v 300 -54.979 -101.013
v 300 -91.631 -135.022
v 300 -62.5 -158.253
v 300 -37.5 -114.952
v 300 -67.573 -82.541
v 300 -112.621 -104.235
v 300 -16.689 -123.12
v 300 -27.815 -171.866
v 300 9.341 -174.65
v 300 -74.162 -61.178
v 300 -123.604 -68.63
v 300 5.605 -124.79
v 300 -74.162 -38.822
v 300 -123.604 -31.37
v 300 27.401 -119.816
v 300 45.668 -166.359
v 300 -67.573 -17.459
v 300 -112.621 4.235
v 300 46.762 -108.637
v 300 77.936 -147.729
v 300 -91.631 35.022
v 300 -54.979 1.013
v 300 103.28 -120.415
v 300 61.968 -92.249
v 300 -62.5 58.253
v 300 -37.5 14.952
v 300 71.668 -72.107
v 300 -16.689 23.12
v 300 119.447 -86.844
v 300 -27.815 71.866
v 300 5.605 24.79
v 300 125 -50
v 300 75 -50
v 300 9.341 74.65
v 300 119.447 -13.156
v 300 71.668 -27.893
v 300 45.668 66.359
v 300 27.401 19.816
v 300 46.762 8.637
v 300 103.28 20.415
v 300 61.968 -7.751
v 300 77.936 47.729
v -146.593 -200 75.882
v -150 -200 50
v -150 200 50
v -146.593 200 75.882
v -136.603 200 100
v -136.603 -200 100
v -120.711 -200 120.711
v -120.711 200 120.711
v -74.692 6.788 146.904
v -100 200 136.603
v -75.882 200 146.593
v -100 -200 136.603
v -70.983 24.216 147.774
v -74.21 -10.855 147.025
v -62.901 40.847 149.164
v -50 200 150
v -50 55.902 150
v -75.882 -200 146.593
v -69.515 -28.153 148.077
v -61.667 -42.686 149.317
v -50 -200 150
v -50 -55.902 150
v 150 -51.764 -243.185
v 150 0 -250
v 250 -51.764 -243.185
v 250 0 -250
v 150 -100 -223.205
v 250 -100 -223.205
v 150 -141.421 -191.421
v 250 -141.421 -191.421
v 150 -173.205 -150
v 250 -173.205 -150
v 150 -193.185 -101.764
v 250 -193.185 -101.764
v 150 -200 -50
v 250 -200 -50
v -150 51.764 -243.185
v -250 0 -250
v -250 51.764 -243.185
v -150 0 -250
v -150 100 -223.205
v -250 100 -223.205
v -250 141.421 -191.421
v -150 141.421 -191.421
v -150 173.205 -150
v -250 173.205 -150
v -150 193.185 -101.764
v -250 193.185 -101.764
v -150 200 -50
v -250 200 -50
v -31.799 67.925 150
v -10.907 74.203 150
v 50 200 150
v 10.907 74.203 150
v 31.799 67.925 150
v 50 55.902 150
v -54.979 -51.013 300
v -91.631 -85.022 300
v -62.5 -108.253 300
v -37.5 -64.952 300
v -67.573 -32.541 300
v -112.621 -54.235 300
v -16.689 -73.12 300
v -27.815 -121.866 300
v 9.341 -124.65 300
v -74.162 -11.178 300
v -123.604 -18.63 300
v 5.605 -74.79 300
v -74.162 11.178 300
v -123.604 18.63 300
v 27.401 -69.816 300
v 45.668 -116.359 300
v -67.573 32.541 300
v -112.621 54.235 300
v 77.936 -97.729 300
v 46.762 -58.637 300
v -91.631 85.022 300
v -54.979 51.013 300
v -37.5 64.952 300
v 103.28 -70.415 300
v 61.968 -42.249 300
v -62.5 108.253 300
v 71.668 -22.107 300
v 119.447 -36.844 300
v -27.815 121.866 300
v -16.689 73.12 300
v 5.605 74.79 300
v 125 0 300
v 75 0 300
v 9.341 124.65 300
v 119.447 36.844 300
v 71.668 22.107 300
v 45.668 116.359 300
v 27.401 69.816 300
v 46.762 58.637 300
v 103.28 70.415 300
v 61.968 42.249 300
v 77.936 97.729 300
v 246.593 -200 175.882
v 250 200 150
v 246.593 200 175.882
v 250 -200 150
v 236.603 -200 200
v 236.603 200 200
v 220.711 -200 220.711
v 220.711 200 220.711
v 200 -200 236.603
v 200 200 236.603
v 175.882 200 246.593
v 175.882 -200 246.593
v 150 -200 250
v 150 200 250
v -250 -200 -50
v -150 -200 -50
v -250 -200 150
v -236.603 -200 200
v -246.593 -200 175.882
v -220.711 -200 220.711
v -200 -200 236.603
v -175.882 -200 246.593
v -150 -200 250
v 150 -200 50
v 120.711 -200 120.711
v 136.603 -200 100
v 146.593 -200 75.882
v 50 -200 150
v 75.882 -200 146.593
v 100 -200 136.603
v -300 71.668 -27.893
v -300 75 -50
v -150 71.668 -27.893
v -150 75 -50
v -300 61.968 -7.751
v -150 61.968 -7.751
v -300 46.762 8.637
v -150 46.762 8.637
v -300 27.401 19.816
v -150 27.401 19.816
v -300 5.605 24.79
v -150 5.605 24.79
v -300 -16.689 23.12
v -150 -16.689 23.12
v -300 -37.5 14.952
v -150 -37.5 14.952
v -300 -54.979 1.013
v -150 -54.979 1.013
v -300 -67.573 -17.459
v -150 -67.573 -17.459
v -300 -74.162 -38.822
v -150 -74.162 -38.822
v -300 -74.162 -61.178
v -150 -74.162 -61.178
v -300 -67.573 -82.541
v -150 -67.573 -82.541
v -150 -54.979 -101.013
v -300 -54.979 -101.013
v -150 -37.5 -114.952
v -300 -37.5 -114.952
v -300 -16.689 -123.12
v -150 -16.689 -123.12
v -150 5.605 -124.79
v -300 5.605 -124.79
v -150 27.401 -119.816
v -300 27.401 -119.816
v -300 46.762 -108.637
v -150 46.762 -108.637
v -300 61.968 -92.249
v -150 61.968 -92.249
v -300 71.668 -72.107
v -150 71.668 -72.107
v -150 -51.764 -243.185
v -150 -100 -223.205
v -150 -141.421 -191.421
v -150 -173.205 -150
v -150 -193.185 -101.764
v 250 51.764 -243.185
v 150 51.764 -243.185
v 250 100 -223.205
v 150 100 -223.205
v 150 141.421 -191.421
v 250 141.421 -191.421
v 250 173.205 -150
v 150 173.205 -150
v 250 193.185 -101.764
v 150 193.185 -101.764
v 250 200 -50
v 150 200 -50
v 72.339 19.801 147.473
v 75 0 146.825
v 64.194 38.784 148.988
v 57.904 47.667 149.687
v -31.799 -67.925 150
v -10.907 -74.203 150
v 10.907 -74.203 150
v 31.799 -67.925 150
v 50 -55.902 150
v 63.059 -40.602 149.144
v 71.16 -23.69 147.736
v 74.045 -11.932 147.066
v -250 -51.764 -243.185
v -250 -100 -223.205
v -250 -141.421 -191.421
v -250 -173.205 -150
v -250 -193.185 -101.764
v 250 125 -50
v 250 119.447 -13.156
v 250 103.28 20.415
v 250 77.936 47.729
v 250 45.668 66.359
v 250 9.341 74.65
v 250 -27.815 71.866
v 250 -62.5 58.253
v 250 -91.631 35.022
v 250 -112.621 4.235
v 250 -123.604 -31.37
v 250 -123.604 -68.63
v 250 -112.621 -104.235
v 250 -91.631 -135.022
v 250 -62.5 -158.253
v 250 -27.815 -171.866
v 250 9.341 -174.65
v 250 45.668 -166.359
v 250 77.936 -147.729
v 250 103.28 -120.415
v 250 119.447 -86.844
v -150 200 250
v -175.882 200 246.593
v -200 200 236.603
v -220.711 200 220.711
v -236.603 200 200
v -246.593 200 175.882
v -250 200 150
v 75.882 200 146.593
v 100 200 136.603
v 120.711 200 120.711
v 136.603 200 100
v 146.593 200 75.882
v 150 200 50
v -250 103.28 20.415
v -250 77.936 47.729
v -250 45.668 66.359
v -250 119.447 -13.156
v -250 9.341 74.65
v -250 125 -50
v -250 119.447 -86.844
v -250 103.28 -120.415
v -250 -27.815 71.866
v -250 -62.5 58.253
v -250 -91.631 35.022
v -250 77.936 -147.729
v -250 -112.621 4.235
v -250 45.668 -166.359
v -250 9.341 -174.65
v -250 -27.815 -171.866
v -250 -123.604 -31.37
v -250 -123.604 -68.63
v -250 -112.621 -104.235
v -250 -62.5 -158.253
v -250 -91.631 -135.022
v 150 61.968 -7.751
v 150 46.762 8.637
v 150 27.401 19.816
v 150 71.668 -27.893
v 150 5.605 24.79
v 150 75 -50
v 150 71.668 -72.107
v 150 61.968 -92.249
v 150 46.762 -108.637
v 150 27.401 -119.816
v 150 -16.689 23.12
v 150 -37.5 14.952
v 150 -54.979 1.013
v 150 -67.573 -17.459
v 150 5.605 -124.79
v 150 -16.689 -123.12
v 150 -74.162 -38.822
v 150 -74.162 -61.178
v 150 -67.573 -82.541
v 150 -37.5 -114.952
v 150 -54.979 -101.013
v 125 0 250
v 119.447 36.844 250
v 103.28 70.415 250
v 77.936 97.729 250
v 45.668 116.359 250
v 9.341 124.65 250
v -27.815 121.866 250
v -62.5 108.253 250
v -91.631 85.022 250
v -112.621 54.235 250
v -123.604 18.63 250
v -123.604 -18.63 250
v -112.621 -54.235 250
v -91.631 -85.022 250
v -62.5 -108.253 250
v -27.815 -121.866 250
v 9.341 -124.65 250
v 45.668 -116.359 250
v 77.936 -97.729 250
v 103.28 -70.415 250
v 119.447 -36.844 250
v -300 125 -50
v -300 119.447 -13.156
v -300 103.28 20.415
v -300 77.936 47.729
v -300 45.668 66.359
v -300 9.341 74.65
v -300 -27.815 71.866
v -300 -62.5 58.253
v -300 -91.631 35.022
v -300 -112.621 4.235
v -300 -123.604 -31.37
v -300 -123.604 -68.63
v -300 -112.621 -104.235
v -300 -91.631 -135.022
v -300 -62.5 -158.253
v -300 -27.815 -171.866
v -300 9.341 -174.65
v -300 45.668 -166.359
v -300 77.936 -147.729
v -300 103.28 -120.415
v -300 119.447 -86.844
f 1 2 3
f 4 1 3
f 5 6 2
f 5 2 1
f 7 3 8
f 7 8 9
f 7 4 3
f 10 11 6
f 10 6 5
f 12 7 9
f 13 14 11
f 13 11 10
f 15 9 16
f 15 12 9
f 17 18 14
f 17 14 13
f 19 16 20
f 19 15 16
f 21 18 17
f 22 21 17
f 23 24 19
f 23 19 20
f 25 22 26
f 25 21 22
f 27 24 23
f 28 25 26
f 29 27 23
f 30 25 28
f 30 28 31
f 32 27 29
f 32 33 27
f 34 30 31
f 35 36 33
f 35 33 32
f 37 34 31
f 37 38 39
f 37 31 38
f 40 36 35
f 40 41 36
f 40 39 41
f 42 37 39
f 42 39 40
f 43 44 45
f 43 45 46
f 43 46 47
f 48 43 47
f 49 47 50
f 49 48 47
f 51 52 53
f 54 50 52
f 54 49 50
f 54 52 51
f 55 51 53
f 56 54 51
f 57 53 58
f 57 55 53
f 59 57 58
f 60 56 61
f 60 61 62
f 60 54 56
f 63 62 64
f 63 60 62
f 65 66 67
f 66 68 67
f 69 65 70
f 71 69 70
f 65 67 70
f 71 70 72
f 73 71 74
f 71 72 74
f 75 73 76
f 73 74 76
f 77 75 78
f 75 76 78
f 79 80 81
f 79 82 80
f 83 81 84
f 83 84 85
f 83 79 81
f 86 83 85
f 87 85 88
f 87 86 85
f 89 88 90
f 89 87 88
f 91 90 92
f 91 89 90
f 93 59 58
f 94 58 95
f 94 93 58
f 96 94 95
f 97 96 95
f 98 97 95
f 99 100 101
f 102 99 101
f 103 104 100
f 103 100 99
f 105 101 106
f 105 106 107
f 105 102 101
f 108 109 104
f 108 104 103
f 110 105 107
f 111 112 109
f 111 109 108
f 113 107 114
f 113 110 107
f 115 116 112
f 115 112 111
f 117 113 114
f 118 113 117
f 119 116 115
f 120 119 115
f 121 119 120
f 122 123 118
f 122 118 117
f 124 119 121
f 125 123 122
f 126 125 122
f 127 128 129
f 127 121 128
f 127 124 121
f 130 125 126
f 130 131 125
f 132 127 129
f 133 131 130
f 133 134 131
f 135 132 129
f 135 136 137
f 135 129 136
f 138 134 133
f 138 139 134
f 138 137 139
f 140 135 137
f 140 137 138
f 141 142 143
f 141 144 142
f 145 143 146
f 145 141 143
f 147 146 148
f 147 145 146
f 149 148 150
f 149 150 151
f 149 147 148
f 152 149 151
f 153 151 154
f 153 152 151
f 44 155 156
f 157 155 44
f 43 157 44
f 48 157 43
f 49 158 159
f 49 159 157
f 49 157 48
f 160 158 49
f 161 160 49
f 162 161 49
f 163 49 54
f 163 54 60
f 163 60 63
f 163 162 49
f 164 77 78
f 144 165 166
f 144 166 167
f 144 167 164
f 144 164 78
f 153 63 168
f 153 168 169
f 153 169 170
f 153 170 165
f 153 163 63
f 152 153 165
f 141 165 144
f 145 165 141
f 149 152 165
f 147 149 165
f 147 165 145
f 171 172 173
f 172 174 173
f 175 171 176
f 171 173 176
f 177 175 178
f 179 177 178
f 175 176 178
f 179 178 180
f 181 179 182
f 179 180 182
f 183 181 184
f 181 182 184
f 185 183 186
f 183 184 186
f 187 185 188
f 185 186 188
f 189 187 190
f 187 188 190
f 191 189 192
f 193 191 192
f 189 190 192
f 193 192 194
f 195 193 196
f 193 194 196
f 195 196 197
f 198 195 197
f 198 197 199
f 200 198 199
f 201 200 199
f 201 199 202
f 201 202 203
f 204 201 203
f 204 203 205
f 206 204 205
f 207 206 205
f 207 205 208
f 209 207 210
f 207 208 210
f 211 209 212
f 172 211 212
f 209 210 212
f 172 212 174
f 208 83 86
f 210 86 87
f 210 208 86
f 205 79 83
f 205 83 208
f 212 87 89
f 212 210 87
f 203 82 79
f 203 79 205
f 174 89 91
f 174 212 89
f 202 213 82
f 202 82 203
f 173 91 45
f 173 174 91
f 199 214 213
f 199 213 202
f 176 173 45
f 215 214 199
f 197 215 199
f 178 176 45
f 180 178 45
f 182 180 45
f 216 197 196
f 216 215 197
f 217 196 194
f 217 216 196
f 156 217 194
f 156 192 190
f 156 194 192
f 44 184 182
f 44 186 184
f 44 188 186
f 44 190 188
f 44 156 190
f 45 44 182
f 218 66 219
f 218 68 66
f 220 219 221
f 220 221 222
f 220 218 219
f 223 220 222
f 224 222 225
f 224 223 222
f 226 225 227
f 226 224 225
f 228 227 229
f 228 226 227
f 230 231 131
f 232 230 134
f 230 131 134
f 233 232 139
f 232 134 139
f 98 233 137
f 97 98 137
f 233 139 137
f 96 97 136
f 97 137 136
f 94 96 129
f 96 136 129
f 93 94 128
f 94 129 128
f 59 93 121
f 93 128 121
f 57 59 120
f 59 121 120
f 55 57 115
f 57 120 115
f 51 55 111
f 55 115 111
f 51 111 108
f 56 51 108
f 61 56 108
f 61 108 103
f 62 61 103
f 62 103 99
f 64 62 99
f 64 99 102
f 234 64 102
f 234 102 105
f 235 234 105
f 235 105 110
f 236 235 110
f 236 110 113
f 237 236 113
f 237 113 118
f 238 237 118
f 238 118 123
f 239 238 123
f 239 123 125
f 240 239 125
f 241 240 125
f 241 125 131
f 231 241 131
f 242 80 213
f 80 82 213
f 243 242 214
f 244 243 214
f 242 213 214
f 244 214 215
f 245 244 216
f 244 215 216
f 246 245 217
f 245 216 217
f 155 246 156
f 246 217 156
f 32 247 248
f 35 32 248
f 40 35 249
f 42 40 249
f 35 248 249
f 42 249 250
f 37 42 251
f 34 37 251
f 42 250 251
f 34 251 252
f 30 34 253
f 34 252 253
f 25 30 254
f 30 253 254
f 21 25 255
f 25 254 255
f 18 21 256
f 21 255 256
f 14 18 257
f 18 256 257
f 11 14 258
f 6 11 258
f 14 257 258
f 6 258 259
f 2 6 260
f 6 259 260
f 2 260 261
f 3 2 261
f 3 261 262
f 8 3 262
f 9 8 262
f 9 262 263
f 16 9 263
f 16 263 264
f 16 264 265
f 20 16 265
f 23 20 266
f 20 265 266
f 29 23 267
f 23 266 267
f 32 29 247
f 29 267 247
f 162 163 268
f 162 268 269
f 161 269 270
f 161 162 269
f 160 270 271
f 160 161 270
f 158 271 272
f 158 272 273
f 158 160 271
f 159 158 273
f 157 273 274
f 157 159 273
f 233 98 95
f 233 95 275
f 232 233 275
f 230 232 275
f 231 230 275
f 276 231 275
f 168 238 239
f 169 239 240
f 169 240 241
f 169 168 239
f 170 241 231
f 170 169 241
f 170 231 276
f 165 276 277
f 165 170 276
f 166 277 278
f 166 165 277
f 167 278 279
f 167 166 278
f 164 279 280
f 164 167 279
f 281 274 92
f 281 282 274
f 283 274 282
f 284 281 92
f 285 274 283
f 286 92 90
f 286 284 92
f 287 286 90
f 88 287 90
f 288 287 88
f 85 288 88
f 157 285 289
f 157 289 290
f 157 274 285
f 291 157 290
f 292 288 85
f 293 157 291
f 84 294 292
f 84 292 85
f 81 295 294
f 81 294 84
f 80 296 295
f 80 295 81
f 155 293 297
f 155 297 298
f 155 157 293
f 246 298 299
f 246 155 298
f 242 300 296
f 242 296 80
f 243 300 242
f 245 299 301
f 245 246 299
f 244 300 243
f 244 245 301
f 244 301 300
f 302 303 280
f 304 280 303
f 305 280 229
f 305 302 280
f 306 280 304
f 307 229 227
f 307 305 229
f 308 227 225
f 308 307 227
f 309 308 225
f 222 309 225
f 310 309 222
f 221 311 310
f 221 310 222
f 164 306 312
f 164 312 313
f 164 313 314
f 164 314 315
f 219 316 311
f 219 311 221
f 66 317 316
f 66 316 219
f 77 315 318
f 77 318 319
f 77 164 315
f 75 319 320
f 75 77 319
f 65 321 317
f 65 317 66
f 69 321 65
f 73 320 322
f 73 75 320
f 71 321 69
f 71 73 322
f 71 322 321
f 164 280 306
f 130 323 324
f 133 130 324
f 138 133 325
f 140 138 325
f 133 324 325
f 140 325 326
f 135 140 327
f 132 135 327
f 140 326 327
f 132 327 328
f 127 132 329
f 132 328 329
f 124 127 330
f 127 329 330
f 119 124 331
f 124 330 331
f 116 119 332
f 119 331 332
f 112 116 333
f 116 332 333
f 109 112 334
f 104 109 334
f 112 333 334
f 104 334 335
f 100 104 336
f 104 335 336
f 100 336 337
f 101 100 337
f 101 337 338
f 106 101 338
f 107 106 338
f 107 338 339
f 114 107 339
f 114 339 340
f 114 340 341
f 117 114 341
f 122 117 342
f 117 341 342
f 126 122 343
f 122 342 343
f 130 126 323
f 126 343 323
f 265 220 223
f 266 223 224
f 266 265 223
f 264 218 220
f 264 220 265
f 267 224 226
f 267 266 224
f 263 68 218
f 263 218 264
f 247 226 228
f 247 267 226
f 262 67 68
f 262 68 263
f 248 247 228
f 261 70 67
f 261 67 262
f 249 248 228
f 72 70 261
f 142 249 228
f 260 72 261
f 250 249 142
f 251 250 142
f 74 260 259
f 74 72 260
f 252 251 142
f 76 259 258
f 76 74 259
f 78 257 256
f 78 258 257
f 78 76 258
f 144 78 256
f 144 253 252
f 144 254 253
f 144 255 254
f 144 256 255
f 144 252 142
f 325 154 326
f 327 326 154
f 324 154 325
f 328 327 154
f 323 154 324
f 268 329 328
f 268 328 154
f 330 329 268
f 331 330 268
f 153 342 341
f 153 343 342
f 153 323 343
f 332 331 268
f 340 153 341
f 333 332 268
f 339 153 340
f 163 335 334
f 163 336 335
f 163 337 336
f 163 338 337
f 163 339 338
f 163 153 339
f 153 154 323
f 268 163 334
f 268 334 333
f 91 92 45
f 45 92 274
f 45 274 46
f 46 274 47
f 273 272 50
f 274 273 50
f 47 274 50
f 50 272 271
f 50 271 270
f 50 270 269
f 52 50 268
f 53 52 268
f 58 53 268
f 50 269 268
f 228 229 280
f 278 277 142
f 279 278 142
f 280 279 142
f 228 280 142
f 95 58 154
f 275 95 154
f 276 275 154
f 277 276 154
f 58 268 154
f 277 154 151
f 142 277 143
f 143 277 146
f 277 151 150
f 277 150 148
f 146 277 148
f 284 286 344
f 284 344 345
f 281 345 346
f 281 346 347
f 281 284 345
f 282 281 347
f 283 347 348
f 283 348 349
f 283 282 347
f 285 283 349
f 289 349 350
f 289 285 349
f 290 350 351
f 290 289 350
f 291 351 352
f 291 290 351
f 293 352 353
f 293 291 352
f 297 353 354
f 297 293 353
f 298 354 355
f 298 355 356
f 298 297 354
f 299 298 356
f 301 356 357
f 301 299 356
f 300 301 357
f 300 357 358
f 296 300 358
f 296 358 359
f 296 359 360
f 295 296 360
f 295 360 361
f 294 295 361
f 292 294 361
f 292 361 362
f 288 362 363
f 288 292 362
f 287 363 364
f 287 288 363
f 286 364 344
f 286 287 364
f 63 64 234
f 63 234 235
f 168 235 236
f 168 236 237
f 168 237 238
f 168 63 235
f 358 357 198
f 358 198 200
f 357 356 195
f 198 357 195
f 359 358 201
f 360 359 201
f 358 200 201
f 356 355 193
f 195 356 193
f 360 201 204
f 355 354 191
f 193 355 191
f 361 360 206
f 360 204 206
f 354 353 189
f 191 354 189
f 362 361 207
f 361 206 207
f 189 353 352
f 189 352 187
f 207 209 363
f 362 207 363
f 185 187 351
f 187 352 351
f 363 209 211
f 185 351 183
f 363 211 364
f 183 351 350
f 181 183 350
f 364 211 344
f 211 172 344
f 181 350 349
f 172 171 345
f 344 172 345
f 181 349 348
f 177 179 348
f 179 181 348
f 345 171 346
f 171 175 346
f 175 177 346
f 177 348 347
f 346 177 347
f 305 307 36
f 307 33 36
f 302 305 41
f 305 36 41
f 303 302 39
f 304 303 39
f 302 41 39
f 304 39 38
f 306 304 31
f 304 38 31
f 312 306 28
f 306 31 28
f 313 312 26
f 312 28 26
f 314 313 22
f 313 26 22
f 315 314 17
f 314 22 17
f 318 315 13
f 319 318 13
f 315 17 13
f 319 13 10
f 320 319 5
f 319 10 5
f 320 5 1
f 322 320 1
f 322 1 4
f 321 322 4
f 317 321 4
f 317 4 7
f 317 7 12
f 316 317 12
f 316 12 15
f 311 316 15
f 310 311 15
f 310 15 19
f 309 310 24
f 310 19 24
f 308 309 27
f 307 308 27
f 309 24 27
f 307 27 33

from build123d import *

# Parameters (mm, degrees)
F1_DEPTH  = 200
F2_R      = 199.99999
F3_R      = 125
F4_DEPTH  = 50
F5_R      = 125
F6_DEPTH  = 50
F7_R      = 75
F8_DEPTH  = 350
F9_R      = 75
F10_DEPTH = 312.5


# Not quite as in the source:
# - a fillet or chamfer is up to 0.001 mm smaller than in the source, because OpenCascade refuses the exact size
# - a pattern or mirror of a feature is missing from the dataset's text; its kind, count and spacing are read off the source's solid


with BuildPart() as f1:
    # F0 (on Front) → F1 (new body, symmetric)
    with BuildSketch(Plane.XZ):
        with BuildLine():
            ThreePointArc((250, 150), (220.7106781187, 220.7106781187), (150, 250))
            Line((150, 250), (-150, 250))
            ThreePointArc((-150, 250), (-220.7106781187, 220.7106781187), (-250, 150))
            Line((-250, 150), (-250, -250))
            Line((-250, -250), (-150, -250))
            Line((-150, -250), (-150, 50))
            ThreePointArc((-150, 50), (-120.7106781187, 120.7106781187), (-50, 150))
            Line((-50, 150), (50, 150))
            ThreePointArc((50, 150), (120.7106781187, 120.7106781187), (150, 50))
            Line((150, 50), (150, -250))
            Line((150, -250), (250, -250))
            Line((250, -250), (250, 150))
        make_face()
    extrude(amount=F1_DEPTH, both=True)

    # F2 (radius 200 in the source; OpenCascade refuses exactly that, so slightly less here)
    f2_edges = [f1.edges().sort_by_distance(p)[0] for p in [
        (-200, -200, -250),
        (-200, 200, -250),
        (200, -200, -250),
        (200, 200, -250),
    ]]
    fillet(f2_edges, radius=F2_R)

    # F3 (on face) → F4 (join)
    with BuildSketch(Plane.YZ.offset(250)):
        with Locations((0, -50)):
            Circle(F3_R)
    f4 = extrude(amount=F4_DEPTH)

    # F4_copies: F4 across plane
    add(f4.mirror(Plane(origin=(0, 0, 0), x_dir=(0, 0, -1), z_dir=(-1, 0, 0))))

    # F5 (on face) → F6 (join)
    with BuildSketch(Plane.XY.offset(250)):
        Circle(F5_R)
    extrude(amount=F6_DEPTH)

    # F7 (on Right) → F8 (cut, symmetric)
    with BuildSketch(Plane.YZ):
        with Locations((0, -50)):
            Circle(F7_R)
    extrude(amount=F8_DEPTH, both=True, mode=Mode.SUBTRACT)

    # F9 (on face) → F10 (cut)
    with BuildSketch(Plane.XY.offset(300)):
        Circle(F9_R)
    extrude(amount=-F10_DEPTH, mode=Mode.SUBTRACT)


solid = f1.part
